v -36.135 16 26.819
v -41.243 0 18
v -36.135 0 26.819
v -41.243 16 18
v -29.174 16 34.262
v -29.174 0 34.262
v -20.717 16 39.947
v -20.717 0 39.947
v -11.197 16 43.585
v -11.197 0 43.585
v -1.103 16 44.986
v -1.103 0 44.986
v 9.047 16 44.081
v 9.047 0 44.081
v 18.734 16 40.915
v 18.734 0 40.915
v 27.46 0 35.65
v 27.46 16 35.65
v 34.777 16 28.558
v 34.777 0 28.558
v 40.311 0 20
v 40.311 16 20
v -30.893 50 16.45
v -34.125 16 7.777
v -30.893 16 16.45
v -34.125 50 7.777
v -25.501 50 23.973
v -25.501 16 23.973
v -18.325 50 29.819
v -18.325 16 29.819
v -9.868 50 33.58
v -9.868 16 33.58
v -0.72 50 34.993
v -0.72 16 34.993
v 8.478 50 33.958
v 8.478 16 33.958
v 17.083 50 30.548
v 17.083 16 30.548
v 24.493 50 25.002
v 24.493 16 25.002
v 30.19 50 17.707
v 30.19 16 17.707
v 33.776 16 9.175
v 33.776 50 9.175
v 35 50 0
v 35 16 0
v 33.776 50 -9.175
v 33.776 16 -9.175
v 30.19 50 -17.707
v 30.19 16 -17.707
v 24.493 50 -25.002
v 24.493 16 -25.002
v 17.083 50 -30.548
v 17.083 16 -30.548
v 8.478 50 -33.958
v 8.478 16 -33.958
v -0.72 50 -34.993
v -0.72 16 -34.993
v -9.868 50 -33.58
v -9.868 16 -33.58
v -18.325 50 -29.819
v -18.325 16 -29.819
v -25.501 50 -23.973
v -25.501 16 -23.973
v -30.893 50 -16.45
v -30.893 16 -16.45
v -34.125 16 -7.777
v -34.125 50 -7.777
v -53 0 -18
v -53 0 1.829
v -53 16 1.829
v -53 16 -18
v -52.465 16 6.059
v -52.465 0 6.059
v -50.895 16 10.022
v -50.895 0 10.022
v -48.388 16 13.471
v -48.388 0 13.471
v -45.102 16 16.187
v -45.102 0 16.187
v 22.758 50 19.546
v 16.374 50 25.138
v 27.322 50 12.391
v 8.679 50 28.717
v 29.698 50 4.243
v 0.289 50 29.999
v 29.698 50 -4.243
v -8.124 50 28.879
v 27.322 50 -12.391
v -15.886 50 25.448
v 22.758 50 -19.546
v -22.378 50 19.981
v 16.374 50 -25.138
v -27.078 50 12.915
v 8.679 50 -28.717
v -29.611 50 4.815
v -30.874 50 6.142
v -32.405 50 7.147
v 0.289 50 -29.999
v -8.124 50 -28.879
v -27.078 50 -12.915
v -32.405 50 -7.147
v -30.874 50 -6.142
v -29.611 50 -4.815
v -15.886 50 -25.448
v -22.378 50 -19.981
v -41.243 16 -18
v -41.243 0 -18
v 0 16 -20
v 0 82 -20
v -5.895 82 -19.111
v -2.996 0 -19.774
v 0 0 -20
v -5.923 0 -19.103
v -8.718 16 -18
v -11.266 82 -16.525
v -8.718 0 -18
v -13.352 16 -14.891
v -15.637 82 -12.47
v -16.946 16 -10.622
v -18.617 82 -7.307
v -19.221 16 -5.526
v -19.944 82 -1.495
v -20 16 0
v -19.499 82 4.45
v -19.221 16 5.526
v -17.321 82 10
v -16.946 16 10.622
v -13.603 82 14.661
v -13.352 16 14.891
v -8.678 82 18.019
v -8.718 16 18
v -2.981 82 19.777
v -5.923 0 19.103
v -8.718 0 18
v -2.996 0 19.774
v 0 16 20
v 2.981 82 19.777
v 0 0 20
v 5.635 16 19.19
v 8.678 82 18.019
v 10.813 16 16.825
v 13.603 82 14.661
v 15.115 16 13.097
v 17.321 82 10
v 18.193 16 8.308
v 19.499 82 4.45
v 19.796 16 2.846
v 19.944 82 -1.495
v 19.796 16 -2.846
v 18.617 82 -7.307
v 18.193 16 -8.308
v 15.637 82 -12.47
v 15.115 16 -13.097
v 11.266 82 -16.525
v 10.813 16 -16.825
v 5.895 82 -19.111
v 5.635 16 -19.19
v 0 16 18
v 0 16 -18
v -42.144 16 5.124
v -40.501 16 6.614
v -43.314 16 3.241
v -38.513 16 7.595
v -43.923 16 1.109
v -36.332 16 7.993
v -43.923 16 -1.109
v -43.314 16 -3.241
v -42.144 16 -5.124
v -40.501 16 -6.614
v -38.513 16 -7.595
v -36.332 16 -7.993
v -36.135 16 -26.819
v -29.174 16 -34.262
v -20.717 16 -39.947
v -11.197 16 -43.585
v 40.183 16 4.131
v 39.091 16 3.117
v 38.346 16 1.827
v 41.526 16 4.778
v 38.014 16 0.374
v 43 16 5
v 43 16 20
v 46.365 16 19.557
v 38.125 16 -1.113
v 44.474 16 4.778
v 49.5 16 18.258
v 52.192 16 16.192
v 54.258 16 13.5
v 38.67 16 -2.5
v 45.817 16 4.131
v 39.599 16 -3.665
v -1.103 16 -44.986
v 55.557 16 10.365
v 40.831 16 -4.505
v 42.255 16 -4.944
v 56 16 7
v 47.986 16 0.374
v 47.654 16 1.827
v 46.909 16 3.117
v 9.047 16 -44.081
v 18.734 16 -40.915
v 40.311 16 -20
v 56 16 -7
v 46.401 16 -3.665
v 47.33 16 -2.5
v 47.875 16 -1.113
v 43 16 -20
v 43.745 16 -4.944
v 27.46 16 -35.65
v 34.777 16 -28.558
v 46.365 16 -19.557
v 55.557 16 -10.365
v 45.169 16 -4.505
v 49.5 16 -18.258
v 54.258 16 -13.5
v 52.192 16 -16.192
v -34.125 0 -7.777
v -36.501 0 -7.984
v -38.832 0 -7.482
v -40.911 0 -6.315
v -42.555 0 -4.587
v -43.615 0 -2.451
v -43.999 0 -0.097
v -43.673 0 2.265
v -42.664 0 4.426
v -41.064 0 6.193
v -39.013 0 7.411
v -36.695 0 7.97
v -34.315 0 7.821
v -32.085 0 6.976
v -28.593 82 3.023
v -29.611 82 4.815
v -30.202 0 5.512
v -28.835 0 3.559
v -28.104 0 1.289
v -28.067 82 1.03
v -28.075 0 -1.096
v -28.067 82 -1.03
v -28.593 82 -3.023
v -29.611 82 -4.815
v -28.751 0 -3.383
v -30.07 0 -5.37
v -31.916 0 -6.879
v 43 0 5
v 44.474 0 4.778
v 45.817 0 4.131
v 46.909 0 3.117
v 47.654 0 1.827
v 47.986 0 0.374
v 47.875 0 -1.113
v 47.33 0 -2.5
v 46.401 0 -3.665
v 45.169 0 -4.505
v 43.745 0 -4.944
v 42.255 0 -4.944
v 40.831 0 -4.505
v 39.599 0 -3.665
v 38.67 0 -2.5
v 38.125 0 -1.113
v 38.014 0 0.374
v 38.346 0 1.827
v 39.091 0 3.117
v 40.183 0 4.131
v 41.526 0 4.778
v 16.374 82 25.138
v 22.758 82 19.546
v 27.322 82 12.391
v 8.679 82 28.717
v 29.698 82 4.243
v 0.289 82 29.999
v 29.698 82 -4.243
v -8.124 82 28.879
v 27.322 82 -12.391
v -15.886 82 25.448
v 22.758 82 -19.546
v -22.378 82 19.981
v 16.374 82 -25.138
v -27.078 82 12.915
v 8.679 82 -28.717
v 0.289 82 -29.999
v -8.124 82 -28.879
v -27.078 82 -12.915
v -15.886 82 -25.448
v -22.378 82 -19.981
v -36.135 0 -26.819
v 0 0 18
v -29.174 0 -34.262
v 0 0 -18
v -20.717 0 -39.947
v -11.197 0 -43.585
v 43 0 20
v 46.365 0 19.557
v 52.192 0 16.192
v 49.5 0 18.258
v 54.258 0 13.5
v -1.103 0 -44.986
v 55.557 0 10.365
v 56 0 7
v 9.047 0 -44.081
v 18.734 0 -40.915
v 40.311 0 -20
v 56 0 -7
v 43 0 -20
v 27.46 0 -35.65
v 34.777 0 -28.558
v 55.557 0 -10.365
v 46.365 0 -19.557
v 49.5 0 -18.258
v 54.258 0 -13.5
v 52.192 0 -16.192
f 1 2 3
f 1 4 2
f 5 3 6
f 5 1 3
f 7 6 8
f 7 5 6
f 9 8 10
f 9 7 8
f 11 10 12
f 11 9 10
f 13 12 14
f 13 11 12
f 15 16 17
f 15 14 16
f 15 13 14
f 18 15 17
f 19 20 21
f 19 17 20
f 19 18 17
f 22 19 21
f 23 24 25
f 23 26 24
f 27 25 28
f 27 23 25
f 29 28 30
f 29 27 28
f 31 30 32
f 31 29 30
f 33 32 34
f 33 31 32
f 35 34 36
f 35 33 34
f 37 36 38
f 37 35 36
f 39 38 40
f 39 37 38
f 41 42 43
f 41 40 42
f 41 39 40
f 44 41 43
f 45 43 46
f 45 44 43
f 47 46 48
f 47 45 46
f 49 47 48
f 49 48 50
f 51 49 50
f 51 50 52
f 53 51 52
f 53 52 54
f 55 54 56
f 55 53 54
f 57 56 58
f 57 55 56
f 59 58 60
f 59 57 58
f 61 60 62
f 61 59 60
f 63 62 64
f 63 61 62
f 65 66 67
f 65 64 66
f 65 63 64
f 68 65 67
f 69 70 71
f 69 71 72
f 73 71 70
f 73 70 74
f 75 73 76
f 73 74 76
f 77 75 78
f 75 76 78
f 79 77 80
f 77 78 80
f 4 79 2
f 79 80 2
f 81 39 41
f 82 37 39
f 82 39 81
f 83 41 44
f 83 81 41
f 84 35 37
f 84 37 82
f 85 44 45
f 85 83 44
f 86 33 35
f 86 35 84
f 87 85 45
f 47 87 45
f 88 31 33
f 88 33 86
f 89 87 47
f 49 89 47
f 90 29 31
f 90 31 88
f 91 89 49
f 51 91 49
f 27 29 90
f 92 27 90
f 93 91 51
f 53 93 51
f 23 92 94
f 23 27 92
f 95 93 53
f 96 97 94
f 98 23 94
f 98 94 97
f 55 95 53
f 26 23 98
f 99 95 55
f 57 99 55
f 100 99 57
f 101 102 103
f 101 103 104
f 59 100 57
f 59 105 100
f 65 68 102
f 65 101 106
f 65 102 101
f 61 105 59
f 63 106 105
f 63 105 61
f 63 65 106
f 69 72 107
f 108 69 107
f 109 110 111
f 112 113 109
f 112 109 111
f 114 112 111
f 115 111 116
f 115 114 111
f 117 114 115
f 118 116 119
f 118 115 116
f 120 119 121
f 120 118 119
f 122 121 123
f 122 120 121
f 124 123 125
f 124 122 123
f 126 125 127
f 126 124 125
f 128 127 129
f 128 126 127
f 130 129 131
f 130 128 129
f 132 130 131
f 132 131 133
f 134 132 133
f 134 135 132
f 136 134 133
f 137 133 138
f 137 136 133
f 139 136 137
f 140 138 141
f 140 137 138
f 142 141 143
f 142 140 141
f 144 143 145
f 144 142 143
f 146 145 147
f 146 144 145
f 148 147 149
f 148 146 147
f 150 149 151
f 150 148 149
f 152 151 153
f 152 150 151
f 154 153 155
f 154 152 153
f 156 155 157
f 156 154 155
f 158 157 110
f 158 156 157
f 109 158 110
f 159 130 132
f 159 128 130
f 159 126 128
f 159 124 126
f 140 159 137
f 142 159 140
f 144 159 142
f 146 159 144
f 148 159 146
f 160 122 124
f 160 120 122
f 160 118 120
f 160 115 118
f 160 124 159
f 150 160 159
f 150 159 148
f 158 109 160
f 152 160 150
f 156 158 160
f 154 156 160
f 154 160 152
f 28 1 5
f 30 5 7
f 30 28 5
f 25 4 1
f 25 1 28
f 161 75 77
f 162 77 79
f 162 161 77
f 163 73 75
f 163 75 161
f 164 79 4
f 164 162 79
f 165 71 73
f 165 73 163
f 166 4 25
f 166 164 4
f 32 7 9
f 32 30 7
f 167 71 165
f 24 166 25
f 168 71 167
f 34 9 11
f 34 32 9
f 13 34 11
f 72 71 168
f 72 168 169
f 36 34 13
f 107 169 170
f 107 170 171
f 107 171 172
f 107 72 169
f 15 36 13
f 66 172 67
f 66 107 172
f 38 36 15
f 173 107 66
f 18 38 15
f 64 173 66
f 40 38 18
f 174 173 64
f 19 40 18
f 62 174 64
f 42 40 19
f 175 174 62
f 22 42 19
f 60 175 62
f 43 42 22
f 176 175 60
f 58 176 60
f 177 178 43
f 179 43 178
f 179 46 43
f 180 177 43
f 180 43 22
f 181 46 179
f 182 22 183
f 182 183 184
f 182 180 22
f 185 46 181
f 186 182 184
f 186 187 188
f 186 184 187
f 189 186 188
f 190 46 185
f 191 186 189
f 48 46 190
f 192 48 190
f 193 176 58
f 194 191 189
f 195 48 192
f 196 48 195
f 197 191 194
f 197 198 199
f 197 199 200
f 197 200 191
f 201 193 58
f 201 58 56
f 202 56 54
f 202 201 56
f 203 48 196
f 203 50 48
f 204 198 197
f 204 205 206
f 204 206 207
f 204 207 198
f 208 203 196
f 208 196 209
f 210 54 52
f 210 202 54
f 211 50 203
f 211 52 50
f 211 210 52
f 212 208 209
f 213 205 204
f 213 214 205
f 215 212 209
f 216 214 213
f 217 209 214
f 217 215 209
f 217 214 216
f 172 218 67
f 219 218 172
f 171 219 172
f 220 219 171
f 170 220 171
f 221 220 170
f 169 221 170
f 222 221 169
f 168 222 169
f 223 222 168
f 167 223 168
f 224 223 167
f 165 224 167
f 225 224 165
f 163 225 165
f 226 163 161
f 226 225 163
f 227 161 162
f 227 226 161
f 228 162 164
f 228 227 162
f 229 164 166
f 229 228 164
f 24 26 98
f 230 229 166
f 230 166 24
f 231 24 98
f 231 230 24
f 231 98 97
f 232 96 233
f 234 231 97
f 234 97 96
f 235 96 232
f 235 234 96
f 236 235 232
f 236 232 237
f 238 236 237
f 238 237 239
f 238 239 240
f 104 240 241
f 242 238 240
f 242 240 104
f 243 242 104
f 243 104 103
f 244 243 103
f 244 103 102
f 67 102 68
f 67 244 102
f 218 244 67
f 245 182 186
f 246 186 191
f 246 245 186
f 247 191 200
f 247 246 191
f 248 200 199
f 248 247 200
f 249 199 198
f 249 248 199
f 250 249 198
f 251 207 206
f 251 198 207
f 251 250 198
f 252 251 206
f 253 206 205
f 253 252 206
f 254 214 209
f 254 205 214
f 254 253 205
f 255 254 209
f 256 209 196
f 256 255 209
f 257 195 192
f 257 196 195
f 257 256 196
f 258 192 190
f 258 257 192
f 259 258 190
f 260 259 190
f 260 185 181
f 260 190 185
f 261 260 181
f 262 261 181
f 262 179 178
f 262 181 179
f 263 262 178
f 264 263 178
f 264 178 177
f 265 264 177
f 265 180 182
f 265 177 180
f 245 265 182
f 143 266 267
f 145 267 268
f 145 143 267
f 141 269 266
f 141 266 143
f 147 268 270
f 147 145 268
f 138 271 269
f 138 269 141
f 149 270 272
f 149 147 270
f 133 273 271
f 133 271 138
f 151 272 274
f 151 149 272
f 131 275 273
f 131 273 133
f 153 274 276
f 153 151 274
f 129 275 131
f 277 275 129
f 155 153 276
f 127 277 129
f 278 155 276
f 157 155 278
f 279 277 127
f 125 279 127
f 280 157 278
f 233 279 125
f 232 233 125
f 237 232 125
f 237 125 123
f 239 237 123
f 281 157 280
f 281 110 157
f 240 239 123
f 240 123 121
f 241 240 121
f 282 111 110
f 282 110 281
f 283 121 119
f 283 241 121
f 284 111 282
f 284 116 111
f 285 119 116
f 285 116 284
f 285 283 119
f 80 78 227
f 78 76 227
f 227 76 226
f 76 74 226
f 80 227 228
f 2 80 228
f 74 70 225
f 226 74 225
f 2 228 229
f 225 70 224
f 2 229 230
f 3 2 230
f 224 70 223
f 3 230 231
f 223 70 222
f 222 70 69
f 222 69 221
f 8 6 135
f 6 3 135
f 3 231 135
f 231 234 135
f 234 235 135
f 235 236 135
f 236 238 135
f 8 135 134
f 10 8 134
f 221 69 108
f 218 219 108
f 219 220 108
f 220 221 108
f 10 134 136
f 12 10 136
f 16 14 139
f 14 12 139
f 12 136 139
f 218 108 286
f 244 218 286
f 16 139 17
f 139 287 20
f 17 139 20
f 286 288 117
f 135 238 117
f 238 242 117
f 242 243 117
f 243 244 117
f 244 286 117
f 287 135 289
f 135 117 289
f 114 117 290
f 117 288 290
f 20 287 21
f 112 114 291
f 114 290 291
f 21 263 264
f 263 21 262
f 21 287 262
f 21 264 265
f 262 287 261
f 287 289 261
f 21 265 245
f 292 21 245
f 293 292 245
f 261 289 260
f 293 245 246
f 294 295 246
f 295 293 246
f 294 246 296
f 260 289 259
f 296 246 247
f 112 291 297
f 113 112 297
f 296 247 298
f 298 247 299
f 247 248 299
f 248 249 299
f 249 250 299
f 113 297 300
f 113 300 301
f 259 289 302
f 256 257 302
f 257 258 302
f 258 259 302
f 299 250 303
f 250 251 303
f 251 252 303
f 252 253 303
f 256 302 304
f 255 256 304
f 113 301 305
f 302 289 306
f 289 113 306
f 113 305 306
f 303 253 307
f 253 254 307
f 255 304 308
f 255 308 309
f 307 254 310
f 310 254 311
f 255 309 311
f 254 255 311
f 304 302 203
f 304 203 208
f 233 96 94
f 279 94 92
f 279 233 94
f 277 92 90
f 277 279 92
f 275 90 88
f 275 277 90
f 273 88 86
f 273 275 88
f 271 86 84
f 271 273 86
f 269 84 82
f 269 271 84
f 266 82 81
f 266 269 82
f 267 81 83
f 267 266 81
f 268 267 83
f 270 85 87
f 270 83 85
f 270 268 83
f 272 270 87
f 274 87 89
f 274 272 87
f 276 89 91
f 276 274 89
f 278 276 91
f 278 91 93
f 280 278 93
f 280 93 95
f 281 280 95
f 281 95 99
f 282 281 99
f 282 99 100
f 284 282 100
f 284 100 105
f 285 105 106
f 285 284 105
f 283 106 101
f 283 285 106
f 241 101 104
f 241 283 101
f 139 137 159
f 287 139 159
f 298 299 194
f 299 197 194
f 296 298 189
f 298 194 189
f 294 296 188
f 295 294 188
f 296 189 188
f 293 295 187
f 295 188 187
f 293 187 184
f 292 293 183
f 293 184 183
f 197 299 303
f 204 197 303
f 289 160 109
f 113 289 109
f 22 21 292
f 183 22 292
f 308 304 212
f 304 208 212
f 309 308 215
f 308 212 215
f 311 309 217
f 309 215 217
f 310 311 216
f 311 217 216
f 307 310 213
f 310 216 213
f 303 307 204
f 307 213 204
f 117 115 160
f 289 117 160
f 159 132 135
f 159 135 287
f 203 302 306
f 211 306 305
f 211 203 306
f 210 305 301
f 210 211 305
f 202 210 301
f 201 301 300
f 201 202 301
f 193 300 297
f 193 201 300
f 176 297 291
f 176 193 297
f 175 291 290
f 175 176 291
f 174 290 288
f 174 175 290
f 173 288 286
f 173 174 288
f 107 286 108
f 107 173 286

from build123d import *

# Parameters (mm, degrees)
SKETCH_9_W          = 53
SKETCH_9_H          = 36
EXTRUDE_1_DEPTH     = 16
SKETCH_10_W         = 56
SKETCH_10_H         = 40
EXTRUDE_2_DEPTH     = 16
SKETCH_11_R         = 8
CUT_EXTRUDE_3_DEPTH = 82
SKETCH_12_R         = 5
CUT_EXTRUDE_6_DEPTH = 82
FILLET_1_R          = 17
FILLET_2_R          = 13


with BuildPart() as part:
    # 草图8 → 旋转1 (revolve)
    with BuildSketch(Plane.XY, mode=Mode.PRIVATE) as revolve_1_sk:
        Polygon((20, 0), (45, 0), (45, 16), (35, 16), (35, 50), (30, 50), (30, 82), (20, 82), align=None)
    revolve(revolve_1_sk.sketch.rotate(Axis((0, -10, 0), (0, 1, 0)), 90), axis=Axis((0, -10, 0), (0, 1, 0)))

    # 草图9 → 凸台-拉伸1 (add)
    with BuildSketch(Plane(origin=(0, 0, 0), x_dir=(1, 0, 0), z_dir=(0, 1, 0))):
        with Locations((-26.5, 0)):
            Rectangle(SKETCH_9_W, SKETCH_9_H)
    extrude(amount=EXTRUDE_1_DEPTH)

    # 草图10 → 凸台-拉伸2 (add)
    with BuildSketch(Plane(origin=(0, 0, 0), x_dir=(1, 0, 0), z_dir=(0, 1, 0))):
        with Locations((28, 0)):
            Rectangle(SKETCH_10_W, SKETCH_10_H)
    extrude(amount=EXTRUDE_2_DEPTH)

    # 草图11 → 切除-拉伸3 (cut)
    with BuildSketch(Plane(origin=(0, 0, 0), x_dir=(1, 0, 0), z_dir=(0, 1, 0))):
        with Locations(Location((-36, 0, 0), (0, 0, 76.445215963))):
            Circle(SKETCH_11_R)
    extrude(amount=CUT_EXTRUDE_3_DEPTH, mode=Mode.SUBTRACT)

    # 草图12 → 切除-拉伸6 (cut)
    with BuildSketch(Plane(origin=(0, 0, 0), x_dir=(1, 0, 0), z_dir=(0, 1, 0))):
        with Locations(Location((43, 0, 0), (0, 0, 270))):
            Circle(SKETCH_12_R)
    extrude(amount=CUT_EXTRUDE_6_DEPTH, mode=Mode.SUBTRACT)

    # 圆角1
    # the kernel refuses this fillet: 17 mm, written as the material it takes off along each edge
    with BuildSketch(Plane(origin=(-53, -40.428103648, 18), x_dir=(0, 0, -1), z_dir=(0, 1, 0))) as fillet_1_piece_1:
        with BuildLine():
            CenterArc((16.171241459, -17), FILLET_1_R, 90, 72.035815704)
            Line((0, -11.756818745), (-0.323424829, -11.65195512))
            ThreePointArc((-0.323424829, -11.65195512), (-0.34, -5.878409373), (-0.34, 0))
            Line((-0.34, 0), (0, 0.34))
            Line((0, 0.34), (16.171241459, 0.34))
            Line((16.171241459, 0.34), (16.171241459, 0))
        make_face()
    extrude(amount=96.856207296, mode=Mode.SUBTRACT)

    # 圆角2
    fillet_2_edges = [part.edges().sort_by_distance(p)[0] for p in [
        (56, 8, 20),
        (56, 8, -20),
    ]]
    fillet(fillet_2_edges, radius=FILLET_2_R)


solid = part.part
